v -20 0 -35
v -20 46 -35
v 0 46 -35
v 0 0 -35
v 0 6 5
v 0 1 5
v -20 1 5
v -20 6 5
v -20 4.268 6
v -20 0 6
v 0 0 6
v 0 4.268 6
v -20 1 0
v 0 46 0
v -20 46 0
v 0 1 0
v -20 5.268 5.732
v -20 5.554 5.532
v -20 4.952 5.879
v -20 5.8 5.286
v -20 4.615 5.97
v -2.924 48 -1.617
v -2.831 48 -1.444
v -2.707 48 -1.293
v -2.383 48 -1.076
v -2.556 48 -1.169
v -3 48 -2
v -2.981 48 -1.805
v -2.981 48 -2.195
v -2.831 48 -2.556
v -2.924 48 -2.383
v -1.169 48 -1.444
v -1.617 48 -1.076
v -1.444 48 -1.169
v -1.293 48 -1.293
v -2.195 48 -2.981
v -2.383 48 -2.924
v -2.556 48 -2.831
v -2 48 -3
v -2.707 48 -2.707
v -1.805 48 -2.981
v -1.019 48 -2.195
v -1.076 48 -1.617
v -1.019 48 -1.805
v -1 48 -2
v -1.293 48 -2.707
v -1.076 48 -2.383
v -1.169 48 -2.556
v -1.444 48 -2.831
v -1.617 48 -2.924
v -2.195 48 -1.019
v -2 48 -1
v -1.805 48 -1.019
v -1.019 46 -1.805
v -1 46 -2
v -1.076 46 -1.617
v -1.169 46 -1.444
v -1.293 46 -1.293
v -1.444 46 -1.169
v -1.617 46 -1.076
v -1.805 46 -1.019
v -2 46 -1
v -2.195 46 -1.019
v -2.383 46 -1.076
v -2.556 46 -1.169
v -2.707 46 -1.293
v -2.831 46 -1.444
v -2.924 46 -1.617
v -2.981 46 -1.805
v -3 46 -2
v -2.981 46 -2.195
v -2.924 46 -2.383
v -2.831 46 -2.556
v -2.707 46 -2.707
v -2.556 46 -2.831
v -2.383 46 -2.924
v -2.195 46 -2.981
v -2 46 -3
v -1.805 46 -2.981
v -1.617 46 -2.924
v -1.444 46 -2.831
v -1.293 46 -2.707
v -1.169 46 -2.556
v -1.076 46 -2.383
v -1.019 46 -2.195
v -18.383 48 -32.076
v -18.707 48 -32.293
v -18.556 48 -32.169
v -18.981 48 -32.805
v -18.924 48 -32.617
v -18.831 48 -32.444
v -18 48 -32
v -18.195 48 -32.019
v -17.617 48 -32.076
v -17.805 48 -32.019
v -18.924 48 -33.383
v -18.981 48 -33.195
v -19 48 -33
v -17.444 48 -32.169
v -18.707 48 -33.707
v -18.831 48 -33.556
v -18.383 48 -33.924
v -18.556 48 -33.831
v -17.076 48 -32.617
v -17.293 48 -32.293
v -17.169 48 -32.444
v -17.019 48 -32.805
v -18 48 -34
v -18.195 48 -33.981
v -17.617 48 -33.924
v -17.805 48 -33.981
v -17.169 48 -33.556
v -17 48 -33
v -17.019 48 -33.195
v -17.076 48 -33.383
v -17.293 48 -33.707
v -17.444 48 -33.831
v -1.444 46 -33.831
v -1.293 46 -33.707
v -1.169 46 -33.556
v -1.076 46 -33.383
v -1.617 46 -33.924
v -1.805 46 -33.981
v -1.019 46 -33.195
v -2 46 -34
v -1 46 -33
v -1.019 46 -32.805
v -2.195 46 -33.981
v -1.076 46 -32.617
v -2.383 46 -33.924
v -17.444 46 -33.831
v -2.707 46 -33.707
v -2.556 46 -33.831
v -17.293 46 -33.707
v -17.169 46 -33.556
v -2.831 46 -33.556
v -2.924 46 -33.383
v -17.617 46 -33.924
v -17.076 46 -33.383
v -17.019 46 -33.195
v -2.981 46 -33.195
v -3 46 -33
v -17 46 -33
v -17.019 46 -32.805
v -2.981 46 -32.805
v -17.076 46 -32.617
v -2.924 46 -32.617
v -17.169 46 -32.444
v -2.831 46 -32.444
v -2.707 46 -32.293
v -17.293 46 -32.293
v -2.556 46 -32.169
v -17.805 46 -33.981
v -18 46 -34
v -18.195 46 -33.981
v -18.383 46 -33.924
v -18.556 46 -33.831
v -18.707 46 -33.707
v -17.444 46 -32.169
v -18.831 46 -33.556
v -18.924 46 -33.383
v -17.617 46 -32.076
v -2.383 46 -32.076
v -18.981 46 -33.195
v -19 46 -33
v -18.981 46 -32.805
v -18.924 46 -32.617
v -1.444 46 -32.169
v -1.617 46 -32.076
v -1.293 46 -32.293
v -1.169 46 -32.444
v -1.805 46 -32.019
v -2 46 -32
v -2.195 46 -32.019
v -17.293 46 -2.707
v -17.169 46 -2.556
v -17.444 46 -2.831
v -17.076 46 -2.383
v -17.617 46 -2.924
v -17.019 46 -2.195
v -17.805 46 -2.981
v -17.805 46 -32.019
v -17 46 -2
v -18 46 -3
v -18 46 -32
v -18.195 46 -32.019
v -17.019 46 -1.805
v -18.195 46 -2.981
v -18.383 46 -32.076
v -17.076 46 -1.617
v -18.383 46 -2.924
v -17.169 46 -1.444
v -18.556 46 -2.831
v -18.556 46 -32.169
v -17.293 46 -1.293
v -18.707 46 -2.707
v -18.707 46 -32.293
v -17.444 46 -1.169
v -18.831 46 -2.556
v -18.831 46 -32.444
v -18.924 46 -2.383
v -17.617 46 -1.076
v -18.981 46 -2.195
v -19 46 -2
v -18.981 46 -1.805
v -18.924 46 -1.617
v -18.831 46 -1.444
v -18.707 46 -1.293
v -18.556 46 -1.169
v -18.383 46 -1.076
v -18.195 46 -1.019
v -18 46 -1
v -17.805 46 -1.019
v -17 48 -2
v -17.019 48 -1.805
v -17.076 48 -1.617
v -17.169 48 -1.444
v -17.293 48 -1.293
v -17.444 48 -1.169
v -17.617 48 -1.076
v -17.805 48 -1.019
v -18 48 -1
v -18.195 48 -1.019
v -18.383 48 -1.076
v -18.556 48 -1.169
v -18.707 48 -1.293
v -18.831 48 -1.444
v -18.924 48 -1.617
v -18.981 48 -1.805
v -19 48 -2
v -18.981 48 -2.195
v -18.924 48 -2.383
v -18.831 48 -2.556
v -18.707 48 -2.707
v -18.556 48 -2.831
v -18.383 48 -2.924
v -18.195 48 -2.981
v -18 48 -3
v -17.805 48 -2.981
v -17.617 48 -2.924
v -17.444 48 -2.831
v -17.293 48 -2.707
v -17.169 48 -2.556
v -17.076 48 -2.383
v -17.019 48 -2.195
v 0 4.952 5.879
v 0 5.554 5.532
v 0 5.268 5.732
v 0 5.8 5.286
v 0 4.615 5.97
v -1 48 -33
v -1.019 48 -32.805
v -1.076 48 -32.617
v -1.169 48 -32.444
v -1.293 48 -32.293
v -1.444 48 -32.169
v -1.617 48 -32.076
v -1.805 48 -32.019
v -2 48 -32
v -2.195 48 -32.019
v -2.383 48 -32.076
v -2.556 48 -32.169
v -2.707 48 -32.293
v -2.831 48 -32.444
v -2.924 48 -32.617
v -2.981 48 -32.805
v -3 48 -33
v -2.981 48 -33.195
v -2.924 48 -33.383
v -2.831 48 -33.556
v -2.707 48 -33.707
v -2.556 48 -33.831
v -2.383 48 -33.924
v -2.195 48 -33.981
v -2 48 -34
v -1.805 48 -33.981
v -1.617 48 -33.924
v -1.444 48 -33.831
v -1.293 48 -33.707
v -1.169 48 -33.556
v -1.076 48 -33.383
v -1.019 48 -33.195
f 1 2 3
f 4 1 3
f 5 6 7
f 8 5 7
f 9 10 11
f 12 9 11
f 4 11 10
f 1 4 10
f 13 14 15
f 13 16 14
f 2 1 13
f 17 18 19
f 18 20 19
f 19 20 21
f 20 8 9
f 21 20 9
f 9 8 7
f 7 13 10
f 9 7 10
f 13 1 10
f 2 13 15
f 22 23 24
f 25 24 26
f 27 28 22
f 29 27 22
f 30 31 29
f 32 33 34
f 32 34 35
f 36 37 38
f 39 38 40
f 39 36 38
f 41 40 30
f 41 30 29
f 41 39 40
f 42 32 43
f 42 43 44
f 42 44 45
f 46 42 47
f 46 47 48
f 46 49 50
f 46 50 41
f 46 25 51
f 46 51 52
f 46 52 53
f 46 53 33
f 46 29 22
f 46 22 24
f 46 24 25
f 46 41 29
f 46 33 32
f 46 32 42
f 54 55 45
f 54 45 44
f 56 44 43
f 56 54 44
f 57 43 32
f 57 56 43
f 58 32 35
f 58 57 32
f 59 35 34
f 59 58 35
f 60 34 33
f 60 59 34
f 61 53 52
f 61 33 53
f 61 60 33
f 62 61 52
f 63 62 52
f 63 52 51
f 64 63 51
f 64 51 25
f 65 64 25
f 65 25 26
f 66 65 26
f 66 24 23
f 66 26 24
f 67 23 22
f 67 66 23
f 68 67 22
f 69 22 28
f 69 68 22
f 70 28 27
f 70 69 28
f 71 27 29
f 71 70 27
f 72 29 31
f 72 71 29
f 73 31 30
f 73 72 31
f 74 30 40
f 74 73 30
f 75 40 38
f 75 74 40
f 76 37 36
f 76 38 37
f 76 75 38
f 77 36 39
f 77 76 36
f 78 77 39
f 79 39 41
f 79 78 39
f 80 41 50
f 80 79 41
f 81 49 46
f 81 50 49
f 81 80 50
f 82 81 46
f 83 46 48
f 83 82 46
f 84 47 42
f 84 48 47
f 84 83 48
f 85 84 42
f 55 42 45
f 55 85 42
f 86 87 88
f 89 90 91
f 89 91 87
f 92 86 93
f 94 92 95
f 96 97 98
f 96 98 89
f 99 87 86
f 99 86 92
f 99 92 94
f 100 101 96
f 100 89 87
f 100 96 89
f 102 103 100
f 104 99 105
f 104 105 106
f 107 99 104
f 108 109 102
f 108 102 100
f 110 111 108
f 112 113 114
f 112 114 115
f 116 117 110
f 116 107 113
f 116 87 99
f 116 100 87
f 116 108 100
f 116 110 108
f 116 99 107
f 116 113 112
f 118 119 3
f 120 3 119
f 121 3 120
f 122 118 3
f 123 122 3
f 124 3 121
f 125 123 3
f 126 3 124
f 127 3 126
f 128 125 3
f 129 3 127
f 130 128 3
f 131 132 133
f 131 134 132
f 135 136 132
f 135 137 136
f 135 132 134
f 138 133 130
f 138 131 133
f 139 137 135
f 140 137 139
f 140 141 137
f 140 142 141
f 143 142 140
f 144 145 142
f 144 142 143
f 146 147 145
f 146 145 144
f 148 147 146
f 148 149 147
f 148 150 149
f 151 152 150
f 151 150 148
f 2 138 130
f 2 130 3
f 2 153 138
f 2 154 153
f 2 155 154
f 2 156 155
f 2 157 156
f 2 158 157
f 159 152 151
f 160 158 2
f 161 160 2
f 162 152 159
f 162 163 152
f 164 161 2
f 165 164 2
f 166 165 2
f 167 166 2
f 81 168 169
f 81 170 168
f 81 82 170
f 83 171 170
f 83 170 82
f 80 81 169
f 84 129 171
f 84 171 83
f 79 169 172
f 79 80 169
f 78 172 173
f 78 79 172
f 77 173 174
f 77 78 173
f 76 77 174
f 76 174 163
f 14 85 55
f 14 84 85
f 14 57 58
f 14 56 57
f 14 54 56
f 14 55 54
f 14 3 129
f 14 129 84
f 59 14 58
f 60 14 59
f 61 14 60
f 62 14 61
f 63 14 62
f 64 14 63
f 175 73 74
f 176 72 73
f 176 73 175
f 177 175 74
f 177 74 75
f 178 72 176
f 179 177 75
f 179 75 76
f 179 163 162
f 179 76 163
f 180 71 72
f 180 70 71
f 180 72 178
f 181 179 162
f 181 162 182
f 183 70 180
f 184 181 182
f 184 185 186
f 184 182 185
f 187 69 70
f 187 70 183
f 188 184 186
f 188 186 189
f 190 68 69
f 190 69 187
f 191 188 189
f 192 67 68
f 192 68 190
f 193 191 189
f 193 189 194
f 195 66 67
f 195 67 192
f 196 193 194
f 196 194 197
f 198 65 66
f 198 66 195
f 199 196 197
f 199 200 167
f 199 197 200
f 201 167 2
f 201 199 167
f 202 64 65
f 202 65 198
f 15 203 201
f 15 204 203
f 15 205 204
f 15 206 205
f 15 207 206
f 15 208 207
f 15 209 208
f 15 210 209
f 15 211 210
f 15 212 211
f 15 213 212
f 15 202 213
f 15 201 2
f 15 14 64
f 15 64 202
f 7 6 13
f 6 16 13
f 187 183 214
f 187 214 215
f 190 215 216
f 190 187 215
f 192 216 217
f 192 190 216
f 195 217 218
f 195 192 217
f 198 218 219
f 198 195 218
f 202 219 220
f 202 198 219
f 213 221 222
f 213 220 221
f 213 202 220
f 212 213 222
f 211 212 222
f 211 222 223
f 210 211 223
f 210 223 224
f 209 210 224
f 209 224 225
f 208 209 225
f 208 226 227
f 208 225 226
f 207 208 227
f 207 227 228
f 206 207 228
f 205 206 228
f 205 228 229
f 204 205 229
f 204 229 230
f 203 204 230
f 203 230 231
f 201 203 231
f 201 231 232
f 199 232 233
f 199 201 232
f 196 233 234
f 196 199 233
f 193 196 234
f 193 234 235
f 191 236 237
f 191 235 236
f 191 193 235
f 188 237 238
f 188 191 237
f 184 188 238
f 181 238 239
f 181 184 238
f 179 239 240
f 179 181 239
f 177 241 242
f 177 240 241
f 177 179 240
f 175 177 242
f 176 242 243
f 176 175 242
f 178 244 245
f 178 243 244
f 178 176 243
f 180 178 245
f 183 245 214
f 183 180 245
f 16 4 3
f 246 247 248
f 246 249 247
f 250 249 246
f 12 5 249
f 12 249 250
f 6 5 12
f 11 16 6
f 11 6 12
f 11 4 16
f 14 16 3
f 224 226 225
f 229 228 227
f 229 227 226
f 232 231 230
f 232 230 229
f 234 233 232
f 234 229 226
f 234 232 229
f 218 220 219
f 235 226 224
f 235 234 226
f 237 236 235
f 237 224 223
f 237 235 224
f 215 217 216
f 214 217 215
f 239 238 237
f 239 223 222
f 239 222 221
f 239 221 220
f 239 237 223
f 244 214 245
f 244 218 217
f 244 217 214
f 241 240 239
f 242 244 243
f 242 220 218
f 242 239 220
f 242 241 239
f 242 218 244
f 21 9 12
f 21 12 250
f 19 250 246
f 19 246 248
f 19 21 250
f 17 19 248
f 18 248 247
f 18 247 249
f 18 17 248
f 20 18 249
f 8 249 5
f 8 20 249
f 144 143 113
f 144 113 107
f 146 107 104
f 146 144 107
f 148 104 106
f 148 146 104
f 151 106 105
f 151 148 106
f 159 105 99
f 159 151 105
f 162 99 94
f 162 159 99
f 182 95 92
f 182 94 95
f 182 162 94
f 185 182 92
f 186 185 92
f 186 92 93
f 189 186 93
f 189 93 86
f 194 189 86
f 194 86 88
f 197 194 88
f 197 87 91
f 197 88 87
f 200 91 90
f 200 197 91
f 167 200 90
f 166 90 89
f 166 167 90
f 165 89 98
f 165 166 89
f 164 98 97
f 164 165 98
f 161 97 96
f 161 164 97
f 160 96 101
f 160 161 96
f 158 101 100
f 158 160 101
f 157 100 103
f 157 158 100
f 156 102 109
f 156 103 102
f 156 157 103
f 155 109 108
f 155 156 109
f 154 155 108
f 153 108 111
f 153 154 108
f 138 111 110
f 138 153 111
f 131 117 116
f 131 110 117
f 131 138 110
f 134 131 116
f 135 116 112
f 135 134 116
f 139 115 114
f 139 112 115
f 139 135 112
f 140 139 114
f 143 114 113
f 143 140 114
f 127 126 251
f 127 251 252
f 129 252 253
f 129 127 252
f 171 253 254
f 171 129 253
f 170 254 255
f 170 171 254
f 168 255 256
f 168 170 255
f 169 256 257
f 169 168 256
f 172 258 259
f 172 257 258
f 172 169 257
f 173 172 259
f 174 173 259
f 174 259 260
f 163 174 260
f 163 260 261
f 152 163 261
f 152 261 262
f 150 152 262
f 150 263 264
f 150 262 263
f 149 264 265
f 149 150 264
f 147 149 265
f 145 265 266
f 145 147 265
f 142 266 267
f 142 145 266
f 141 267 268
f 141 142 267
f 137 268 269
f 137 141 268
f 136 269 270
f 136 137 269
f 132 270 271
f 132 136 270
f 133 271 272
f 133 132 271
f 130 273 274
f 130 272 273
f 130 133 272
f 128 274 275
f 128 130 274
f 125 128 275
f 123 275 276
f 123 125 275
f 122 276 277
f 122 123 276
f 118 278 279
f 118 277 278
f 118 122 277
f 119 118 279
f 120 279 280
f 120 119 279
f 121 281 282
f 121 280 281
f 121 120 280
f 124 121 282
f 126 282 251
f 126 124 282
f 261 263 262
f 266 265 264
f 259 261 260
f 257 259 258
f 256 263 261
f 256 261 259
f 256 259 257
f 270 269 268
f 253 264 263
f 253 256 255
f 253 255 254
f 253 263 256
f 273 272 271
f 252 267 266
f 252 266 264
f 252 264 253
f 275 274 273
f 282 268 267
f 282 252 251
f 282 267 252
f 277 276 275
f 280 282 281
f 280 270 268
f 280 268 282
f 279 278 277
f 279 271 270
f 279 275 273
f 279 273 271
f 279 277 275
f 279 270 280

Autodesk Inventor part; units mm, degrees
ref_plane "YZ Plane" through (0, 0, 0) normal (1, 0, 0) x (0, 1, 0)
ref_plane "XZ Plane" through (0, 0, 0) normal (0, 1, 0) x (-1, 0, 0)
ref_plane "XY Plane" through (0, 0, 0) normal (0, 0, 1) x (1, 0, 0)
sketch "Sketch1" plane through (0, 0, 0) normal (0, 1, 0) x (-1, 0, 0)
  line L0 (0, 0) -> (20, 0)
  line L1 (20, 0) -> (20, -35)
  line L2 (20, -35) -> (0, -35)
  line L3 (0, -35) -> (0, 0)
  dimension "d0" = 20
  dimension "d1" = 35
extrude "Extrusion1" add sketch "Sketch1" along normal blind 46
sketch "Sketch2" plane through (-20, 0, 0) normal (0, 0, 1) x (1, 0, 0)
  line L0 (0, 0) -> (0, 46) projected
  line L1 (20, 0) -> (20, 46) projected
  line L2 (0, 0) -> (20, 0)
  line L3 (20, 0) -> (20, 1)
  line L4 (20, 1) -> (0, 1)
  line L5 (0, 1) -> (0, 0)
  dimension "d4" = 1
extrude "Extrusion2" add sketch "Sketch2" along normal blind 6
sketch "Sketch3" plane through (-20, 1, 0) normal (0, 1, 0) x (1, 0, 0)
  line L0 (0, 35) -> (0, -6) projected
  line L1 (20, 35) -> (20, -6) projected
  line L2 (0, -6) -> (20, -6)
  line L3 (20, -6) -> (20, -5)
  line L4 (20, -5) -> (0, -5)
  line L5 (0, -5) -> (0, -6)
  point P0 (20, 0)
  dimension "d7" = 1
extrude "Extrusion3" add sketch "Sketch3" along normal blind 5
fillet "Fillet1" radius 2 1 edges at (-10, 6, 6)
sketch "Sketch4" plane through (0, 46, 0) normal (0, 1, 0) x (1, 0, 0)
  arc A0 (-20, 2) -> (-18, 0) centre (-18, 2) ccw projected
  circle A1 centre (-18, 2) radius 1
  arc A2 (-2, 0) -> (0, 2) centre (-2, 2) ccw projected
  circle A3 centre (-2, 2) radius 1
  arc A4 (0, 33) -> (-2, 35) centre (-2, 33) ccw projected
  circle A5 centre (-2, 33) radius 1
  arc A6 (-18, 35) -> (-20, 33) centre (-18, 33) ccw projected
  circle A7 centre (-18, 33) radius 1
  point P0 (0, 0)
  dimension "d11" = 2
  dimension "d12" = 2
  dimension "d13" = 2
  dimension "d14" = 2
extrude "Extrusion4" add sketch "Sketch4" along normal blind 2
properties part number "platform"
